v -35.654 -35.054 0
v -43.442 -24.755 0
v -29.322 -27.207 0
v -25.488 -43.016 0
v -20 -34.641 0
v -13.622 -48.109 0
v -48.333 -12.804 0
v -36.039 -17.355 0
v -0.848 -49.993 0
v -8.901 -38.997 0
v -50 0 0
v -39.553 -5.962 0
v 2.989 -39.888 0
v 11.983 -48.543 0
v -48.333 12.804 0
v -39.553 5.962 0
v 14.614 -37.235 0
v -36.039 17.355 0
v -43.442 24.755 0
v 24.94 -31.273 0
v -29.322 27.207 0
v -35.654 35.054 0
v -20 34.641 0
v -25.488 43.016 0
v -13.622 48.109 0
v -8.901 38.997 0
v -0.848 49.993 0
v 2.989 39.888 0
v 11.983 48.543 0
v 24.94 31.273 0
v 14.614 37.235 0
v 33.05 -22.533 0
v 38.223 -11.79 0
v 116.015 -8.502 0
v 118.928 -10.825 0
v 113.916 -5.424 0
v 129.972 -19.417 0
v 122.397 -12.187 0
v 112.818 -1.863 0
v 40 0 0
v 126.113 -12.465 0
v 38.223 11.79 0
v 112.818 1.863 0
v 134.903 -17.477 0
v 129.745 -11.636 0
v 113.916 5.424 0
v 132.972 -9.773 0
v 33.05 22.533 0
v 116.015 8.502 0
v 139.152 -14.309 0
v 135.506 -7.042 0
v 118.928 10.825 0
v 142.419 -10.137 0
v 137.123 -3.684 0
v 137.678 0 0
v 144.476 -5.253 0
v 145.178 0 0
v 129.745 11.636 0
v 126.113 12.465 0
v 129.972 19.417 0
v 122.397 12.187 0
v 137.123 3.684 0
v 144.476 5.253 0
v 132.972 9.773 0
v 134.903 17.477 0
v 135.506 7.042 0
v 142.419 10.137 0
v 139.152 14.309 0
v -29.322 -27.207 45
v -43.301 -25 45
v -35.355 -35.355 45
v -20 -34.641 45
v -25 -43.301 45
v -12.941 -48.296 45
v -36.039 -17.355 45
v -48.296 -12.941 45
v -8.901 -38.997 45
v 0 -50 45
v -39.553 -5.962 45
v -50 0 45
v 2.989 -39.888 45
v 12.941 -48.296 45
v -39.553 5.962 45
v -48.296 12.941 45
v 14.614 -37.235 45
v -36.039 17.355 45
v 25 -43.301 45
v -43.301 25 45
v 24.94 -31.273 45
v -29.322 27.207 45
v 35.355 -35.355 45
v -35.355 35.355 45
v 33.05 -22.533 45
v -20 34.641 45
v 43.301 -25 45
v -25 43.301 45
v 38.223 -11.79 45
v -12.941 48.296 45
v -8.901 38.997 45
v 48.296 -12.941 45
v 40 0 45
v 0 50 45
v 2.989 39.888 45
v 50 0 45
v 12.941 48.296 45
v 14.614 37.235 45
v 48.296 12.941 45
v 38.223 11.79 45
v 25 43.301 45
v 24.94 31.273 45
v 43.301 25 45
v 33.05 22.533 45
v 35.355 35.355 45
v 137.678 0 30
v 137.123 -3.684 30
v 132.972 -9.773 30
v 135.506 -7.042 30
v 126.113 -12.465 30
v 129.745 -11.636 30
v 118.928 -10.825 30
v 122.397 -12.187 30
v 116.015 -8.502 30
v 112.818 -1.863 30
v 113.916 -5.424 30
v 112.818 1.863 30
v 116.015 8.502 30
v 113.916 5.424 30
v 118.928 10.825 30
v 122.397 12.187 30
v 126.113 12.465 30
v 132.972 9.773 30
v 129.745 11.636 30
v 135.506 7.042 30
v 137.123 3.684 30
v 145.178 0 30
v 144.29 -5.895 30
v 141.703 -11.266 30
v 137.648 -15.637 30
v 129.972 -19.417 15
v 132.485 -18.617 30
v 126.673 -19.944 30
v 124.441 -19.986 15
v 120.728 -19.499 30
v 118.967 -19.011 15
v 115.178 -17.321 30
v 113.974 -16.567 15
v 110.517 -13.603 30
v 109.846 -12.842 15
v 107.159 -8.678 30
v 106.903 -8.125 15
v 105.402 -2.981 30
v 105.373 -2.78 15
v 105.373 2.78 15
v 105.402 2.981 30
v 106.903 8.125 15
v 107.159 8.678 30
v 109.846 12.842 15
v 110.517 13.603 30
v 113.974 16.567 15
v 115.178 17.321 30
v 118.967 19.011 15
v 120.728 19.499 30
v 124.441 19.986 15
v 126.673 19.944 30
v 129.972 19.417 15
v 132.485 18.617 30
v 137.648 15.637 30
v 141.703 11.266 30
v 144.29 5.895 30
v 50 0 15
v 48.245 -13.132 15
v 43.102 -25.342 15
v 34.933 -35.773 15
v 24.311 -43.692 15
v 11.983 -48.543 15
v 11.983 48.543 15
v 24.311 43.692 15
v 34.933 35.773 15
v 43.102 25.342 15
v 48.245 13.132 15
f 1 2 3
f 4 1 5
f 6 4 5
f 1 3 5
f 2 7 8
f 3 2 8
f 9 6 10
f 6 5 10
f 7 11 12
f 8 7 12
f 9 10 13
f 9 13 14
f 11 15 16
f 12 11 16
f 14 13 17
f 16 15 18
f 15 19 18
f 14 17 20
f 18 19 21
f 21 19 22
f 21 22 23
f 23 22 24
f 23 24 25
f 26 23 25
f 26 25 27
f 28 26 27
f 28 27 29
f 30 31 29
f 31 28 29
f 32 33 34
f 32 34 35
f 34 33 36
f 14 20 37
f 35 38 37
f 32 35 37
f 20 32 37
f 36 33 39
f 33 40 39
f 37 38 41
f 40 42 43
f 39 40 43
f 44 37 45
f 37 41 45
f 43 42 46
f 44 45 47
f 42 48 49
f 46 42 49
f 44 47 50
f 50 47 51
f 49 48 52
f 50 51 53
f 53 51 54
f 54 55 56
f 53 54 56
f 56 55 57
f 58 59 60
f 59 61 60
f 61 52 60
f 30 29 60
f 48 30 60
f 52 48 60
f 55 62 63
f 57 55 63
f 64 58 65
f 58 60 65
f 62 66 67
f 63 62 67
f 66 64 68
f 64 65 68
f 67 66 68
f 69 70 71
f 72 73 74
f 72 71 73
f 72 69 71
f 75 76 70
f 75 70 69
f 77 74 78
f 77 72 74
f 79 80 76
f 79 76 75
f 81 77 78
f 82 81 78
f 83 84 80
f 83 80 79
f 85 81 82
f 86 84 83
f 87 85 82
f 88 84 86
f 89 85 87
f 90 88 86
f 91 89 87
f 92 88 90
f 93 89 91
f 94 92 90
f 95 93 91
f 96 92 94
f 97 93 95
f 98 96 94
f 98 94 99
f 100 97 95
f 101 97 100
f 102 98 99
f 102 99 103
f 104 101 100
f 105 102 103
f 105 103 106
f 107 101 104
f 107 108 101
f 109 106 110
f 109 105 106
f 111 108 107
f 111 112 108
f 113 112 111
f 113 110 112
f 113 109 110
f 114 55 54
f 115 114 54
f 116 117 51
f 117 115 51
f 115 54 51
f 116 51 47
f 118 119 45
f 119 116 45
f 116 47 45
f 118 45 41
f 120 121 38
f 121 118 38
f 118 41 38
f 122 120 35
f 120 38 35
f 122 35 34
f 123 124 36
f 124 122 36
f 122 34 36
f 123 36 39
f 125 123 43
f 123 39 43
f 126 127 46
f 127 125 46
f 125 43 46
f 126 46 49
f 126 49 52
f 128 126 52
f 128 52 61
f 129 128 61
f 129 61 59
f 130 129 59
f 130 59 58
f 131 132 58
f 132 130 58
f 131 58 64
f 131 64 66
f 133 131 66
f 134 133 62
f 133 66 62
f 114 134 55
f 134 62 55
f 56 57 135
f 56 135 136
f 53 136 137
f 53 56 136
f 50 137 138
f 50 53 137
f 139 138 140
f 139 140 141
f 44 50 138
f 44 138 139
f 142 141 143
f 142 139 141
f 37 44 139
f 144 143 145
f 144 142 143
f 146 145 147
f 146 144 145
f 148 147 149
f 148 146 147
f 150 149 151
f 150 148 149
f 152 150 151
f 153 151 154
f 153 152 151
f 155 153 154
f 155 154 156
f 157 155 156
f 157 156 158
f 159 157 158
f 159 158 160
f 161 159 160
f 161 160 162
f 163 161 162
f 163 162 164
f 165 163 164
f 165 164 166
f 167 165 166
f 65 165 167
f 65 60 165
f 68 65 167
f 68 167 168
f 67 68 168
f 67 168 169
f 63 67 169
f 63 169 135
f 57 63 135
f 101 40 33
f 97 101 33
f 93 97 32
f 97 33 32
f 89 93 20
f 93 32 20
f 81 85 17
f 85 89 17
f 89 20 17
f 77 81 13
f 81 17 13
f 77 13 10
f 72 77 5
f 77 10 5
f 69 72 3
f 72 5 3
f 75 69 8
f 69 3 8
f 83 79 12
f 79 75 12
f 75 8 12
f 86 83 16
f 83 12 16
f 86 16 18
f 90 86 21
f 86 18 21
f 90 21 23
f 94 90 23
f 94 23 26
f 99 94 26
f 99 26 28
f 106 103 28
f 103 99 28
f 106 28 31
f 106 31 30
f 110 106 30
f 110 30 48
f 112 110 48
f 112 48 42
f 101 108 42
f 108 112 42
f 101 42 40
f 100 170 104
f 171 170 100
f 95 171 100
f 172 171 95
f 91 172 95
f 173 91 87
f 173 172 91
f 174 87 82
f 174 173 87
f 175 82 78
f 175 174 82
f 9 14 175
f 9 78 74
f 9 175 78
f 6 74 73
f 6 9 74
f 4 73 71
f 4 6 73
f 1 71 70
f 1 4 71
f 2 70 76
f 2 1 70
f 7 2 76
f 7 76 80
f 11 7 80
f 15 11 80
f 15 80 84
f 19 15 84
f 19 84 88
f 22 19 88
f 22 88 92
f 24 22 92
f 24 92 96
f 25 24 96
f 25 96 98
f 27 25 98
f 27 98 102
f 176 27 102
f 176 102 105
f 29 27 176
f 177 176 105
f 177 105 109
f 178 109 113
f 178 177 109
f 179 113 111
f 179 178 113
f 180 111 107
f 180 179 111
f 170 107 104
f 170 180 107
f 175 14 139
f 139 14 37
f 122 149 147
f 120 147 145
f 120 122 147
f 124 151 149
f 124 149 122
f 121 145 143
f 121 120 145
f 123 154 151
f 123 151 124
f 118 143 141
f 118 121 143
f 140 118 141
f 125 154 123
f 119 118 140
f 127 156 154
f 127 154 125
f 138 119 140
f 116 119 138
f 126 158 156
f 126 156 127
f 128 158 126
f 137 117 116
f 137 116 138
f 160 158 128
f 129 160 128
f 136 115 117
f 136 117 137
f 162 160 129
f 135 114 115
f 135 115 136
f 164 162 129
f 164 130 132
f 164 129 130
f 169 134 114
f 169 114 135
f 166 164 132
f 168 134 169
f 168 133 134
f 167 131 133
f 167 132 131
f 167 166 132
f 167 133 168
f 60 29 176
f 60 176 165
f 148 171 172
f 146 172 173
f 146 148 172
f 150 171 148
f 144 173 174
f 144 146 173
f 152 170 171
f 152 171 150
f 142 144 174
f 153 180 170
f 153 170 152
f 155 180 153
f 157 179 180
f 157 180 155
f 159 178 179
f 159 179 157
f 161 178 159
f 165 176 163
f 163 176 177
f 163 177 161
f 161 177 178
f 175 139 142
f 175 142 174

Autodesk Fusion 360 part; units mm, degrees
sketch "스케치1" plane through (0, 0, 0) normal (0, 0, 1) x (1, 0, 0)
  circle A0 centre (0, 0) radius 50
  circle A1 centre (125.1784, 0) radius 20
  line L0 (11.9829, 48.5429) -> (129.9716, 19.4171)
  line L1 (11.9829, -48.5429) -> (129.9716, -19.4171)
  circle A2 centre (0, 0) radius 40
  circle A3 centre (125.1784, 0) radius 12.5
  dimension "d1" = 100
  dimension "d2" = 40
  dimension "d3" = 80
  dimension "d4" = 25
extrude "돌출4" add sketch "스케치1" along normal blind 45 contours A0 makes body 1
extrude "돌출5" add sketch "스케치1" along normal blind 30 separate body contours A1 makes body 2
extrude "돌출6" add sketch "스케치1" along normal blind 15 contours A0 A1 L0 L1 bodies 1 2
